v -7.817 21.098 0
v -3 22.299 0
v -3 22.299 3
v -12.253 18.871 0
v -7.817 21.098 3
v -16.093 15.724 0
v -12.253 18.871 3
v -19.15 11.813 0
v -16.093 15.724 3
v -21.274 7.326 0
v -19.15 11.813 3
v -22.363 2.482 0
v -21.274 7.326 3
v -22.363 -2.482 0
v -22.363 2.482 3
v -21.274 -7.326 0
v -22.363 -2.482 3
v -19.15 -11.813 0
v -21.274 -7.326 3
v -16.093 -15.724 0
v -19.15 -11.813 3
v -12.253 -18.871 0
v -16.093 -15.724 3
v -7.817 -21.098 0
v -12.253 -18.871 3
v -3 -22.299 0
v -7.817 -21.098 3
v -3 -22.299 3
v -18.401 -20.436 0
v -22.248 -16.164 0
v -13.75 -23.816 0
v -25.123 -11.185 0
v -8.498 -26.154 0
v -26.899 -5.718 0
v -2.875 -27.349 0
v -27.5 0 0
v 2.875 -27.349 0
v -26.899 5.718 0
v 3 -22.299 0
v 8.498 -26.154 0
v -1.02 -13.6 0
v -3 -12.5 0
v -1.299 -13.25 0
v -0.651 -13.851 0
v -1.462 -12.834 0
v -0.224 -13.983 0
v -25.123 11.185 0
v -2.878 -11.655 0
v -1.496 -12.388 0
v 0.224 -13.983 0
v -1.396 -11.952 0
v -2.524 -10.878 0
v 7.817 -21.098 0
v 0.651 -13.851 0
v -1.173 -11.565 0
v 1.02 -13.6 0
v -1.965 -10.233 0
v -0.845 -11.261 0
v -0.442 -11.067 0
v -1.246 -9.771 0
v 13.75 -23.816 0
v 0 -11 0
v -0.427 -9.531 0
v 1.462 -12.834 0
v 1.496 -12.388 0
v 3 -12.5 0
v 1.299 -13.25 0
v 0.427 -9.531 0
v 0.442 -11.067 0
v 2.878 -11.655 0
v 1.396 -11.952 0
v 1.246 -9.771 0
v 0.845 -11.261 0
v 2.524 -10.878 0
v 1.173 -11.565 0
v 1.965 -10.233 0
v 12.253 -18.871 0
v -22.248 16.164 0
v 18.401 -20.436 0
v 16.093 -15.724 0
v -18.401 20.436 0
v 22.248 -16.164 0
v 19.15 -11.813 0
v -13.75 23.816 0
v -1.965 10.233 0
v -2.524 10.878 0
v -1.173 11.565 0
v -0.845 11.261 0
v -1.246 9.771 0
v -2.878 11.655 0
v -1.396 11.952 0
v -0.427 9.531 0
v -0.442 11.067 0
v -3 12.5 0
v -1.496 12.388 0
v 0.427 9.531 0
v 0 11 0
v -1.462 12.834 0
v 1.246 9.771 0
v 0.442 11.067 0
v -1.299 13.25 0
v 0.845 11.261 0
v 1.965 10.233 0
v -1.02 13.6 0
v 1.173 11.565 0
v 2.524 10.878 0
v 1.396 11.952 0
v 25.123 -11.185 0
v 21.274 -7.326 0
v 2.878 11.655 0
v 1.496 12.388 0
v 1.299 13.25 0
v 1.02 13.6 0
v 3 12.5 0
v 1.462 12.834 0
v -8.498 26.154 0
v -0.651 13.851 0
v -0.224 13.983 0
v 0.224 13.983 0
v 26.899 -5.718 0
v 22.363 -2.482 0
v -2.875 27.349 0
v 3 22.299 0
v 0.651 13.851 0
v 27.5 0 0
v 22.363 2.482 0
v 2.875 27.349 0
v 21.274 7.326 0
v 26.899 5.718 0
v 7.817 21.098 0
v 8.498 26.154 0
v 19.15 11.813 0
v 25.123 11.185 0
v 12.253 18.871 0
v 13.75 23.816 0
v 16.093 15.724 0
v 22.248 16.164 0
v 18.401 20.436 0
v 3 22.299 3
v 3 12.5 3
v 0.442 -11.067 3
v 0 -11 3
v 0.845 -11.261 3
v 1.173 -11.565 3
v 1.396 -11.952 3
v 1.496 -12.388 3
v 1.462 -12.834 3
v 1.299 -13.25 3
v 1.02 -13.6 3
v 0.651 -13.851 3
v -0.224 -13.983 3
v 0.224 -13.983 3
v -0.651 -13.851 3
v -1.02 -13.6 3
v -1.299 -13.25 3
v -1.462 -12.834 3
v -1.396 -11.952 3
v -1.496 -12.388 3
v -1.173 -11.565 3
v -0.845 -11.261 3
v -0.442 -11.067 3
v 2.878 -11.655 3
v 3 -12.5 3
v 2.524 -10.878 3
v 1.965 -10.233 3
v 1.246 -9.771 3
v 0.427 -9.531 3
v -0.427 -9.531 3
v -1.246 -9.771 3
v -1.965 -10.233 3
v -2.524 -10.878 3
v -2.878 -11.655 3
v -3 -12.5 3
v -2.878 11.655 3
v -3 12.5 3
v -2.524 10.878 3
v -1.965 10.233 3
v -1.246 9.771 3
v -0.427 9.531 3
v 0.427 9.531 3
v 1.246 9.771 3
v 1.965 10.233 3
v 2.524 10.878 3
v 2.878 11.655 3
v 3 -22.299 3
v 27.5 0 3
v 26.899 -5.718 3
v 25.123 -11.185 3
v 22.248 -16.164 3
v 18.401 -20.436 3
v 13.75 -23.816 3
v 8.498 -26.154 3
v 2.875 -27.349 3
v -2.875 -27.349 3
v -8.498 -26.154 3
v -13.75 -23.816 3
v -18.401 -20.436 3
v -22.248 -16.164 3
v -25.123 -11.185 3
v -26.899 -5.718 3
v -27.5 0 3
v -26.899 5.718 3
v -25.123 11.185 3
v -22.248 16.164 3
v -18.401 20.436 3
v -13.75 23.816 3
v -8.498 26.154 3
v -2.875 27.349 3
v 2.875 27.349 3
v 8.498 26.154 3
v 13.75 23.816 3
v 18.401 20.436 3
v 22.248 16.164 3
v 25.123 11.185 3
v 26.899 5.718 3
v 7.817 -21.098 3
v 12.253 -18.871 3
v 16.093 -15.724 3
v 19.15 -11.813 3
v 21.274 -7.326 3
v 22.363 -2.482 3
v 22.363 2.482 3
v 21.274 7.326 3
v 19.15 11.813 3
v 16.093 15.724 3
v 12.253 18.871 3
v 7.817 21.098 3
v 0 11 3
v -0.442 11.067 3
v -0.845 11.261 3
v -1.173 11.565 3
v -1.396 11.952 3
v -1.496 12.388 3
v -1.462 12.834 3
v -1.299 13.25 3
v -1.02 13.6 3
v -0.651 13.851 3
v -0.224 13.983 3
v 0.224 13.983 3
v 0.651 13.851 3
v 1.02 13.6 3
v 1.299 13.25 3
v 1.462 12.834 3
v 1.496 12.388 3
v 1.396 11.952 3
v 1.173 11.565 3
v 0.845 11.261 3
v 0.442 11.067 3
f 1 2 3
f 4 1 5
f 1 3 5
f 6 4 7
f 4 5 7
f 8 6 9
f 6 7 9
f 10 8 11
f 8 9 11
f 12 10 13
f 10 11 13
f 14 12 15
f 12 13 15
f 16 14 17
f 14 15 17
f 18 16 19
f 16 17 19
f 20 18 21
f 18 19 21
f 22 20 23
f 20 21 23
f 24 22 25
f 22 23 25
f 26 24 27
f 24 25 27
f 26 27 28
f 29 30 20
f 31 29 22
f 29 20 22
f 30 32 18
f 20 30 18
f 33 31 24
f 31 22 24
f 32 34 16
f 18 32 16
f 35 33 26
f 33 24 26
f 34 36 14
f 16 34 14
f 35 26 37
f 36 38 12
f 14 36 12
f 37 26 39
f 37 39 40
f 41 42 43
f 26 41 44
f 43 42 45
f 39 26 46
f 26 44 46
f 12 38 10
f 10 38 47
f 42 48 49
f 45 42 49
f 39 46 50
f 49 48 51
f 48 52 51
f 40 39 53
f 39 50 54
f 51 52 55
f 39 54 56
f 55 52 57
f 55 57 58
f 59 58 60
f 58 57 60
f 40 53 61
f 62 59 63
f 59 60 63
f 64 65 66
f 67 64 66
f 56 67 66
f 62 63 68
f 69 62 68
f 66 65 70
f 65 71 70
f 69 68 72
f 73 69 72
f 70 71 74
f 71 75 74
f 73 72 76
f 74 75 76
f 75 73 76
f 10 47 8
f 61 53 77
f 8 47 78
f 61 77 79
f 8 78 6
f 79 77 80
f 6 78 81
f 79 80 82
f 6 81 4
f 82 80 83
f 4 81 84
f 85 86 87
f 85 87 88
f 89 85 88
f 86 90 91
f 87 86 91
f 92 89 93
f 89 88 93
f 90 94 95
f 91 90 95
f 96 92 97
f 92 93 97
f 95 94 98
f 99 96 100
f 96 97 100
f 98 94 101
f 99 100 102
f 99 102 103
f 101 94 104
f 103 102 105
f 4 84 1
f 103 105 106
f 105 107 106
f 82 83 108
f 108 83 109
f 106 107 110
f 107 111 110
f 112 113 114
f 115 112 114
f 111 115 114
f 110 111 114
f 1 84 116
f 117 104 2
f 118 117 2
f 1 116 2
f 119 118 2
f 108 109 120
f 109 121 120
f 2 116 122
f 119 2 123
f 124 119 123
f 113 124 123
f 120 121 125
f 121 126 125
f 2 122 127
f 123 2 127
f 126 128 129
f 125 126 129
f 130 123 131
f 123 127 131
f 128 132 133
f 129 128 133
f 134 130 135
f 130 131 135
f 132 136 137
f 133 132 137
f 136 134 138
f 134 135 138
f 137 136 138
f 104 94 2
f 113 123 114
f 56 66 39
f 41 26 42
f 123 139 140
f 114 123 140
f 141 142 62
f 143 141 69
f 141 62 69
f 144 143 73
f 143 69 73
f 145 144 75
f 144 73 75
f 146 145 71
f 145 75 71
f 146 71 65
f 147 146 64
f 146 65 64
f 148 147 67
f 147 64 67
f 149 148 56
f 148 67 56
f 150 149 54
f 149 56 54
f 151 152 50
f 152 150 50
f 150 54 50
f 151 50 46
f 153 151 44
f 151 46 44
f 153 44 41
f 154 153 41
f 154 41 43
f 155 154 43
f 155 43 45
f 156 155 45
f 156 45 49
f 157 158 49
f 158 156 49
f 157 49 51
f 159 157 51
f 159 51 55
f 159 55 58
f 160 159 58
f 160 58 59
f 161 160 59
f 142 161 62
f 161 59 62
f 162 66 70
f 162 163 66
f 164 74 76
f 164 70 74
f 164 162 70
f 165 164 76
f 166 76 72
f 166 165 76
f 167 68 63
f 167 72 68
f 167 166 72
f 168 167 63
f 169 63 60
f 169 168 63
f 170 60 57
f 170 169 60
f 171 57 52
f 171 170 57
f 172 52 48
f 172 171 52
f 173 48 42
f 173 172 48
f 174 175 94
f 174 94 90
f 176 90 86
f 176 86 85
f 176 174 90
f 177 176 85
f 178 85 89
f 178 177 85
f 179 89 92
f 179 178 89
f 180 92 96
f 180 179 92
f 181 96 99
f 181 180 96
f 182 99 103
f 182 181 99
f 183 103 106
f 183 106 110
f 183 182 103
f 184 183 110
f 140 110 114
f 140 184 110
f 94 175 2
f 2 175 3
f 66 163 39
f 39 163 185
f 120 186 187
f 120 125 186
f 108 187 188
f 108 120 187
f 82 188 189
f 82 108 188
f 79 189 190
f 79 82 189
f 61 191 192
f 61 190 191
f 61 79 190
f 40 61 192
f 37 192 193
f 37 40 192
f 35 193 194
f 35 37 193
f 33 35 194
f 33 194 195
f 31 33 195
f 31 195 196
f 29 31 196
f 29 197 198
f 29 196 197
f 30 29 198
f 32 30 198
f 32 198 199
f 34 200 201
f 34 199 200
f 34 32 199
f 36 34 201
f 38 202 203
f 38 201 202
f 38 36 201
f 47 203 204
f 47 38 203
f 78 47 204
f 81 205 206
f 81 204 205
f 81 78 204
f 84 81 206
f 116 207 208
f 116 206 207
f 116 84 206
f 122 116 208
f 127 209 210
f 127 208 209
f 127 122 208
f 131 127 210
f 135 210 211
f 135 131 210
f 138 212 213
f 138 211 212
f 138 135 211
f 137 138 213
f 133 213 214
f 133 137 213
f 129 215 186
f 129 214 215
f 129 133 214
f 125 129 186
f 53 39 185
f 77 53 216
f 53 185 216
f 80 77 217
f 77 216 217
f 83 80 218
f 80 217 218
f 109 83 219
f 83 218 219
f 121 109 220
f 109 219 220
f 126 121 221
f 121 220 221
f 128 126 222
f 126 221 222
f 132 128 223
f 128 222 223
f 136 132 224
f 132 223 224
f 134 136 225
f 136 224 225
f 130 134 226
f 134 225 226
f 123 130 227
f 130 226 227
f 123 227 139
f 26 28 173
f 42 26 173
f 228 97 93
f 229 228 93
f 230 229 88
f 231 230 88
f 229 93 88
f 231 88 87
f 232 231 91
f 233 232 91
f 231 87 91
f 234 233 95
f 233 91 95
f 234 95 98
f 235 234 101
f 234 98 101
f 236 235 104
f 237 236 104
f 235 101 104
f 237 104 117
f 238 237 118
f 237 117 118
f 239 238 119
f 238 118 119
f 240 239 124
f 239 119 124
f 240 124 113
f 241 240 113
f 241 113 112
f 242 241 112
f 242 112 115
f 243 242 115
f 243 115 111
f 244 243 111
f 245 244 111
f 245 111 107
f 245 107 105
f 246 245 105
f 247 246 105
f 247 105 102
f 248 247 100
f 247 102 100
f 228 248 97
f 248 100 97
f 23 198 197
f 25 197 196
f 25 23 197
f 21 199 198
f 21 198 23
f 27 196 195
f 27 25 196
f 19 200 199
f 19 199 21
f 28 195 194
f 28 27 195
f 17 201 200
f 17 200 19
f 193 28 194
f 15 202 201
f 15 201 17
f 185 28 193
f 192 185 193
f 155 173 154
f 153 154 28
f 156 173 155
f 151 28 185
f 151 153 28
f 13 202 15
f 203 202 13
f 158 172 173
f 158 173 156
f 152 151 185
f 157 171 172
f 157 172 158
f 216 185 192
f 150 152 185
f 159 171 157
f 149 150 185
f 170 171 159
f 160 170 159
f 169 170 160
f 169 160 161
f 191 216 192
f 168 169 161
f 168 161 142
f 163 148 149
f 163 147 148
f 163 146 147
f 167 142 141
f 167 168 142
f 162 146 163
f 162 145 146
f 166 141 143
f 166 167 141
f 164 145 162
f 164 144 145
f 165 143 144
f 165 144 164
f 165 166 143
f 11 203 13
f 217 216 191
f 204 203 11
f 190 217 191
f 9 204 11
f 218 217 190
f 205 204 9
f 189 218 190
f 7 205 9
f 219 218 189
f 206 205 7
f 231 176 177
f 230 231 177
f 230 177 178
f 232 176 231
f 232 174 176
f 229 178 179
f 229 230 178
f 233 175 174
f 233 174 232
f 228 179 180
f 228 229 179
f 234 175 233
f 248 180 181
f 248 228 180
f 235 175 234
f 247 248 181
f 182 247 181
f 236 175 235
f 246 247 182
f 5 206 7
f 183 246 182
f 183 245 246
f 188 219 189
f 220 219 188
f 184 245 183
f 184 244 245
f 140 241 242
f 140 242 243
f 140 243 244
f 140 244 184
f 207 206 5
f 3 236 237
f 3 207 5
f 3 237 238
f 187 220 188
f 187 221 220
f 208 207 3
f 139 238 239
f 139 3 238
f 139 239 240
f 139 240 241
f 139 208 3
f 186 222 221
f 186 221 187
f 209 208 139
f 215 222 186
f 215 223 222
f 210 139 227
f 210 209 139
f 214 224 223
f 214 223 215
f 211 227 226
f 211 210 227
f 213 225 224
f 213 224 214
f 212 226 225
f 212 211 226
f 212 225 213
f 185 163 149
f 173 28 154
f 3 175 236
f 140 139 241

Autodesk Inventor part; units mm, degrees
ref_plane "YZ Plane" through (0, 0, 0) normal (1, 0, 0) x (0, 1, 0)
ref_plane "XZ Plane" through (0, 0, 0) normal (0, 1, 0) x (-1, 0, 0)
ref_plane "XY Plane" through (0, 0, 0) normal (0, 0, 1) x (1, 0, 0)
sketch "Sketch1" plane through (0, 0, 0) normal (0, 0, 1) x (1, 0, 0)
  circle A0 centre (0, 0) radius 27.5
  dimension "d0" = 55
extrude "Extrusion1" add sketch "Sketch1" along normal blind 3
sketch "Sketch2" plane through (0, 0, 3) normal (0, 0, 1) x (1, 0, 0)
  circle A0 centre (0, 0) radius 27.5 projected
  circle A1 centre (0, 0) radius 22.5
  dimension "d3" = 45
extrude "Extrusion2" cut sketch "Sketch2" against normal up to next contours A1
sketch "Sketch4" plane through (0, 0, 3) normal (0, 0, 1) x (1, 0, 0)
  circle A0 centre (0, 0) radius 22.5 projected
  line L0 (0, 12.5) -> (0, 22.5) construction
  line L1 (-3, 12.5) -> (-3, 22.5)
  line L2 (3, 22.5) -> (3, 12.5)
  arc A1 (-3, 12.5) -> (3, 12.5) centre (0, 12.5) ccw
  arc A2 (3, 22.5) -> (-3, 22.5) centre (0, 22.5) ccw
  point P0 (0, 17.5)
  dimension "d10" = 10
  dimension "d11" = 6
extrude "Extrusion4" add sketch "Sketch4" against normal up to surface (3 mm away) contours L2 A1 L1 A0 | A0 L1 A2 L2 picked at (-0.3342, 15.8259)
hole "Hole1" at (0, 12.5, 3) direction (0, 0, -1) diameter 3 end through all
mirror "Mirror1" about plane through (0, 0, 0) normal (0, 1, 0) of "Extrusion4", "Hole1"
properties part number "TreeHolder"
